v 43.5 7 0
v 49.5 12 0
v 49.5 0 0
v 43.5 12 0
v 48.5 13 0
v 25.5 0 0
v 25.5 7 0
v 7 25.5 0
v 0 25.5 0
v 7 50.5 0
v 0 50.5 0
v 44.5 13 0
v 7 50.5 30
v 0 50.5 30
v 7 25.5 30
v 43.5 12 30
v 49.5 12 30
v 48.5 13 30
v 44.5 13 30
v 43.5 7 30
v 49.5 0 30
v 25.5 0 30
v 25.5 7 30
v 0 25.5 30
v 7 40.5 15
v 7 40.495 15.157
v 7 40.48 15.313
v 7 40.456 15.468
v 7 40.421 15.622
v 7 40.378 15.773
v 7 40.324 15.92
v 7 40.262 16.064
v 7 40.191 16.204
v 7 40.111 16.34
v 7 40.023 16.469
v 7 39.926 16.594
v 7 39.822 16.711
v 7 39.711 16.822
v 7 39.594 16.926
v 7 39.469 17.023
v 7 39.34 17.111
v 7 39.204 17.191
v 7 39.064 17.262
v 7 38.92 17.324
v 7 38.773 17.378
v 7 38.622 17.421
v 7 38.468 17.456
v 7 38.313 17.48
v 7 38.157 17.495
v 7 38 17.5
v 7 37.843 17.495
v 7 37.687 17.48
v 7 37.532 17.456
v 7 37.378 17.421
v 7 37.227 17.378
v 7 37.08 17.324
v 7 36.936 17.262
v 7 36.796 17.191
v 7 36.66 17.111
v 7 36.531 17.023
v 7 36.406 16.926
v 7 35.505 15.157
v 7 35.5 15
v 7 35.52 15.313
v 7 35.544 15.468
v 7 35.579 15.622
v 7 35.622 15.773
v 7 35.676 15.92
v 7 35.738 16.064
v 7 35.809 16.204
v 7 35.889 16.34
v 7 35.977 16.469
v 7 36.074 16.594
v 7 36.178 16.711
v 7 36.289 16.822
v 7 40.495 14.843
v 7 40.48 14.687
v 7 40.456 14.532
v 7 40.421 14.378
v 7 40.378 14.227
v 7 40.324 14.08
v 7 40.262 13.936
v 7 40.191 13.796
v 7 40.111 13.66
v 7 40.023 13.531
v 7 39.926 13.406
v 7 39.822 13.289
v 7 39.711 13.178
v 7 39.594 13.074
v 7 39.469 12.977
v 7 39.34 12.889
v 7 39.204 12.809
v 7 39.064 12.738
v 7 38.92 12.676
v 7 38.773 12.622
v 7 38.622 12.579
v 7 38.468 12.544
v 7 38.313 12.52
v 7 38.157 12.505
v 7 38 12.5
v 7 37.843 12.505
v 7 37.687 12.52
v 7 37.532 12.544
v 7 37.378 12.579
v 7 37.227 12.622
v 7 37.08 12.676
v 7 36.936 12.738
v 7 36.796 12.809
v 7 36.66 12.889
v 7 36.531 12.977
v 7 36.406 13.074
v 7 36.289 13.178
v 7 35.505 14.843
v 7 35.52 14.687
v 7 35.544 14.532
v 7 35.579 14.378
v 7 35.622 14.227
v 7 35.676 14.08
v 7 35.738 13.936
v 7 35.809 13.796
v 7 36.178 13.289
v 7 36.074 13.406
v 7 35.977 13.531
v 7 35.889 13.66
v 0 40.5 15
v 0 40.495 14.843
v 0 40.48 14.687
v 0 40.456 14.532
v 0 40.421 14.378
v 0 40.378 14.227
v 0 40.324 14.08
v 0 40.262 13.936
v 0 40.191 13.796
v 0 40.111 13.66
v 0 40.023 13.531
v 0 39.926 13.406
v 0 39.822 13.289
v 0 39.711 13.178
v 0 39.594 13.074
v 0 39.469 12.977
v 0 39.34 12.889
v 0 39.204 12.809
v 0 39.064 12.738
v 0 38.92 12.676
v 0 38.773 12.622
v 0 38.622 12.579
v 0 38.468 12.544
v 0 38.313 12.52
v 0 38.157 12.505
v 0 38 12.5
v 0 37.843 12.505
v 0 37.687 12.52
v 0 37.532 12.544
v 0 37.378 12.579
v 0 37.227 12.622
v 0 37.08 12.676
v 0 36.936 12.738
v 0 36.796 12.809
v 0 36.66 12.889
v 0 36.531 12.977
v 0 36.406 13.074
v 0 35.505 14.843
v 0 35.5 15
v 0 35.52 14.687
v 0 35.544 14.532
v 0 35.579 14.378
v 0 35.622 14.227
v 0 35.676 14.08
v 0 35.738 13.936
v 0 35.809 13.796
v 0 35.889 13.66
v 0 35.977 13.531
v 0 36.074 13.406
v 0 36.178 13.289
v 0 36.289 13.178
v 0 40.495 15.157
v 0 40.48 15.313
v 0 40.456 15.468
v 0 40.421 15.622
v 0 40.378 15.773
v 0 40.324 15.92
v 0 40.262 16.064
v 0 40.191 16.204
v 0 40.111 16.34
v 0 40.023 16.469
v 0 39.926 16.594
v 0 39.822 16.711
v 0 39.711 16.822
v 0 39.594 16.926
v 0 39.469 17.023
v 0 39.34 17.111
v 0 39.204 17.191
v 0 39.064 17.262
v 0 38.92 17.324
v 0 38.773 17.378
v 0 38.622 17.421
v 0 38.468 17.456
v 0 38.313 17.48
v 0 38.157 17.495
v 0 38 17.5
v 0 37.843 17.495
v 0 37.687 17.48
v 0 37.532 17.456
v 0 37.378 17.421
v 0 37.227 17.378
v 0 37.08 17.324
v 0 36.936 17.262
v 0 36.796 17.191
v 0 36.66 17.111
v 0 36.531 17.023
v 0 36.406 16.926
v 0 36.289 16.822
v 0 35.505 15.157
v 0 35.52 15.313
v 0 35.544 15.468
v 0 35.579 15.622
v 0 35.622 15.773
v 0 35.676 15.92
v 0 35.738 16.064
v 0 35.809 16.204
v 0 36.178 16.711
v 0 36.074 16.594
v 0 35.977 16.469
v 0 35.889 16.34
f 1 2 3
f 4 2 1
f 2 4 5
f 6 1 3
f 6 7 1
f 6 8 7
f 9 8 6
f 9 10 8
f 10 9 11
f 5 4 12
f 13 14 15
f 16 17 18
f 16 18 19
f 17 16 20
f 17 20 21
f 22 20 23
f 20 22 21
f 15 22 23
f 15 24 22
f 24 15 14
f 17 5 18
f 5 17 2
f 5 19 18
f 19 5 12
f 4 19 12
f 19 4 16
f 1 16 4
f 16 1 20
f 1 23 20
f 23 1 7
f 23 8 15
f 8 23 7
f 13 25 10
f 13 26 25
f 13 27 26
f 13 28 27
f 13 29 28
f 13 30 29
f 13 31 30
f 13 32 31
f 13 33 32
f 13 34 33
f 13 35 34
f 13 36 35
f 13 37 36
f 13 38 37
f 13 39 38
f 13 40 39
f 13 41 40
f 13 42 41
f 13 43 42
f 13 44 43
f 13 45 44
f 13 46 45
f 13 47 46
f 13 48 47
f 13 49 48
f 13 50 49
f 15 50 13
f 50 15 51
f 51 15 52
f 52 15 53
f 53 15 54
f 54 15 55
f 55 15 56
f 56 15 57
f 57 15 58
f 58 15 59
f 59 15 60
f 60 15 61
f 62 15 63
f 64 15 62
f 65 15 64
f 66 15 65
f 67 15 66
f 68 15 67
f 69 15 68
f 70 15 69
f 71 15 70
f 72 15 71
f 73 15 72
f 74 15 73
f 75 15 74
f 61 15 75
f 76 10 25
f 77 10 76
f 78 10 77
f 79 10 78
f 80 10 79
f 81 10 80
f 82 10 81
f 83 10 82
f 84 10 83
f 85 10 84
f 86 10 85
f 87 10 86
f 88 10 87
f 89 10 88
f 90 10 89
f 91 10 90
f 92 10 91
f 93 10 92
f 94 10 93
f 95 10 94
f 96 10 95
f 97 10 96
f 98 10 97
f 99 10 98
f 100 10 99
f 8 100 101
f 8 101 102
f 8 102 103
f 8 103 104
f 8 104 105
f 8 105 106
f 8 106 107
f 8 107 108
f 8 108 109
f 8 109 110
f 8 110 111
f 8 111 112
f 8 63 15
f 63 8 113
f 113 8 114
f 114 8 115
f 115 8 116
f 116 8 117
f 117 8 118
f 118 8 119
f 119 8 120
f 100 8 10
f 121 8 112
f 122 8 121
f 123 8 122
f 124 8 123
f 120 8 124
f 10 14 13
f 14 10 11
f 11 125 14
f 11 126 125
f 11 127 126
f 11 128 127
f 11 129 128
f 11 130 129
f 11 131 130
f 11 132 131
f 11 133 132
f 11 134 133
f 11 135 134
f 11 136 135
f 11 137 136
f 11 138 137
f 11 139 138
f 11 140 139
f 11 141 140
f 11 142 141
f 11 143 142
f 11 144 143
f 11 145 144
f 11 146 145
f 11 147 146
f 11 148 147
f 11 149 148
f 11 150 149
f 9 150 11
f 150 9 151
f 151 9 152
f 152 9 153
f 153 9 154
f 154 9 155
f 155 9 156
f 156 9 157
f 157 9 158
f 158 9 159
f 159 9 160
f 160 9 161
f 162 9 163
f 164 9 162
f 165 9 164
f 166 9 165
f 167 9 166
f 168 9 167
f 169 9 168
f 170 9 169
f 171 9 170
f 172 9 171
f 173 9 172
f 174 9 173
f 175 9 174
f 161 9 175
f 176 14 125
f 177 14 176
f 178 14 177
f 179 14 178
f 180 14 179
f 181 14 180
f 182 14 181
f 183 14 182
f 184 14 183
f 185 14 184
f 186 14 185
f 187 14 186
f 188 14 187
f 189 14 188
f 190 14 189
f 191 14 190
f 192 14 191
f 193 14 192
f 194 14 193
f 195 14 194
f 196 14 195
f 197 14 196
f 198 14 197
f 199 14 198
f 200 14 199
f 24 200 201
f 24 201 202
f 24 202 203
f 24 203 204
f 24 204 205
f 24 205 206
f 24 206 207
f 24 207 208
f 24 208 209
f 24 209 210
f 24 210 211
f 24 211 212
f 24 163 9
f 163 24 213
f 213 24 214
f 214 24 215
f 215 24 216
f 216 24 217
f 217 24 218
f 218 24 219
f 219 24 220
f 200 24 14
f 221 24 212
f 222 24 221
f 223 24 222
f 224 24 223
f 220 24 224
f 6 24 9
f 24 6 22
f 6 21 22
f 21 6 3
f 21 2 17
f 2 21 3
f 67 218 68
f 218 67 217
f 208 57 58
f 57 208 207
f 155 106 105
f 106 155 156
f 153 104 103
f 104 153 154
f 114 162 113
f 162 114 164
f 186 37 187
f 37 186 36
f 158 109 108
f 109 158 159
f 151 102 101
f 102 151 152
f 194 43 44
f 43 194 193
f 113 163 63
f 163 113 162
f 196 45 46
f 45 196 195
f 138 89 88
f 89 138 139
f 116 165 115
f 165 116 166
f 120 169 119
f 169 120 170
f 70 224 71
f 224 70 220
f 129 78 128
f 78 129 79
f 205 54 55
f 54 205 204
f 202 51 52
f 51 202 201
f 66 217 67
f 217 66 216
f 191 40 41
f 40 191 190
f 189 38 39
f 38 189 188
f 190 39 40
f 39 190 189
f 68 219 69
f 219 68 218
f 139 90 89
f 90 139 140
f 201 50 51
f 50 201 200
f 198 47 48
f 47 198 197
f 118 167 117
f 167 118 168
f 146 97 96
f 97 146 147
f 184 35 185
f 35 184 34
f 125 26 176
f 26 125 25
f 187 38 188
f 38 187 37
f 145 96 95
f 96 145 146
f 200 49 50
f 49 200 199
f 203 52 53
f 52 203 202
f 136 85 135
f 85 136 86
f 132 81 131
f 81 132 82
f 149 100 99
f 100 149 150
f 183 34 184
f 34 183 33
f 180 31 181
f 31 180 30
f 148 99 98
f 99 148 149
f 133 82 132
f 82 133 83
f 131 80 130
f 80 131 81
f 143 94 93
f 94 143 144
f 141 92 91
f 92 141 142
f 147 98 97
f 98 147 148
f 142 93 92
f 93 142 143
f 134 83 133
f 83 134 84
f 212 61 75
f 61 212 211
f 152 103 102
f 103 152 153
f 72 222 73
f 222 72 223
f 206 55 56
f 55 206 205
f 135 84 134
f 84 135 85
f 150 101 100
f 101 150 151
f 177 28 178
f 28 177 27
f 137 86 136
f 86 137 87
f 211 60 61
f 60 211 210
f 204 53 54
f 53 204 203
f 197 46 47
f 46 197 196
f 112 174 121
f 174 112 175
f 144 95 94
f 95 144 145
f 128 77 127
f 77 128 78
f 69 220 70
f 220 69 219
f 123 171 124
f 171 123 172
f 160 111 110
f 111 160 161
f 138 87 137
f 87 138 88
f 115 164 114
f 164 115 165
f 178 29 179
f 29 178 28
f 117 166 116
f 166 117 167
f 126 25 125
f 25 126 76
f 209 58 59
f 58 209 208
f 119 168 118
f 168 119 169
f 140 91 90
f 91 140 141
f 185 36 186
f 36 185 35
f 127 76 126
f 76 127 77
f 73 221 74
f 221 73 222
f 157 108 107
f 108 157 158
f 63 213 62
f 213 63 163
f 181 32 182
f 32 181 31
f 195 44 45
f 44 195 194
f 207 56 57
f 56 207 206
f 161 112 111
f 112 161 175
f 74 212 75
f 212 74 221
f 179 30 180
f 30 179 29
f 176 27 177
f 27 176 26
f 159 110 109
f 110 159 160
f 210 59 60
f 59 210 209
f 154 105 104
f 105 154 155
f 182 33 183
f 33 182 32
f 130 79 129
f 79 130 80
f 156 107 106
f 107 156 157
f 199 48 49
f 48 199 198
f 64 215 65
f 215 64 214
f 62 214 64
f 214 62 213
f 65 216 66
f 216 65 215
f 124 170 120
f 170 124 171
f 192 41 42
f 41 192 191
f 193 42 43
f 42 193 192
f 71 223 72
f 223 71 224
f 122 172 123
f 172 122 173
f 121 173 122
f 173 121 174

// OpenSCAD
// Setup
$fn = 100;
$fa = 1;
$fs = 0.4;

moulding = 25.5; // 0.5mm tolerance
plywood  = 18.0;
thick    = 7.0;
lip      = 6.0;
width    = 30.0;
top      = 25.0;
hole     = 5.0;

difference() {
linear_extrude(width) {
    polygon([[0,moulding], [moulding,0], [moulding+plywood+lip,0],
             [moulding+plywood+lip,thick+lip-1], [moulding+plywood+lip-1,thick+lip],
             [moulding+plywood+1,thick+lip], [moulding+plywood,thick+lip-1],
             [moulding+plywood,thick],
             [moulding,thick], [thick,moulding],
             [thick,moulding+top], [0,moulding+top]]);
}
translate([0,moulding+top/2,width/2]) rotate([0,90,0]) cylinder(h = thick*2, d= hole, center = true);
}
